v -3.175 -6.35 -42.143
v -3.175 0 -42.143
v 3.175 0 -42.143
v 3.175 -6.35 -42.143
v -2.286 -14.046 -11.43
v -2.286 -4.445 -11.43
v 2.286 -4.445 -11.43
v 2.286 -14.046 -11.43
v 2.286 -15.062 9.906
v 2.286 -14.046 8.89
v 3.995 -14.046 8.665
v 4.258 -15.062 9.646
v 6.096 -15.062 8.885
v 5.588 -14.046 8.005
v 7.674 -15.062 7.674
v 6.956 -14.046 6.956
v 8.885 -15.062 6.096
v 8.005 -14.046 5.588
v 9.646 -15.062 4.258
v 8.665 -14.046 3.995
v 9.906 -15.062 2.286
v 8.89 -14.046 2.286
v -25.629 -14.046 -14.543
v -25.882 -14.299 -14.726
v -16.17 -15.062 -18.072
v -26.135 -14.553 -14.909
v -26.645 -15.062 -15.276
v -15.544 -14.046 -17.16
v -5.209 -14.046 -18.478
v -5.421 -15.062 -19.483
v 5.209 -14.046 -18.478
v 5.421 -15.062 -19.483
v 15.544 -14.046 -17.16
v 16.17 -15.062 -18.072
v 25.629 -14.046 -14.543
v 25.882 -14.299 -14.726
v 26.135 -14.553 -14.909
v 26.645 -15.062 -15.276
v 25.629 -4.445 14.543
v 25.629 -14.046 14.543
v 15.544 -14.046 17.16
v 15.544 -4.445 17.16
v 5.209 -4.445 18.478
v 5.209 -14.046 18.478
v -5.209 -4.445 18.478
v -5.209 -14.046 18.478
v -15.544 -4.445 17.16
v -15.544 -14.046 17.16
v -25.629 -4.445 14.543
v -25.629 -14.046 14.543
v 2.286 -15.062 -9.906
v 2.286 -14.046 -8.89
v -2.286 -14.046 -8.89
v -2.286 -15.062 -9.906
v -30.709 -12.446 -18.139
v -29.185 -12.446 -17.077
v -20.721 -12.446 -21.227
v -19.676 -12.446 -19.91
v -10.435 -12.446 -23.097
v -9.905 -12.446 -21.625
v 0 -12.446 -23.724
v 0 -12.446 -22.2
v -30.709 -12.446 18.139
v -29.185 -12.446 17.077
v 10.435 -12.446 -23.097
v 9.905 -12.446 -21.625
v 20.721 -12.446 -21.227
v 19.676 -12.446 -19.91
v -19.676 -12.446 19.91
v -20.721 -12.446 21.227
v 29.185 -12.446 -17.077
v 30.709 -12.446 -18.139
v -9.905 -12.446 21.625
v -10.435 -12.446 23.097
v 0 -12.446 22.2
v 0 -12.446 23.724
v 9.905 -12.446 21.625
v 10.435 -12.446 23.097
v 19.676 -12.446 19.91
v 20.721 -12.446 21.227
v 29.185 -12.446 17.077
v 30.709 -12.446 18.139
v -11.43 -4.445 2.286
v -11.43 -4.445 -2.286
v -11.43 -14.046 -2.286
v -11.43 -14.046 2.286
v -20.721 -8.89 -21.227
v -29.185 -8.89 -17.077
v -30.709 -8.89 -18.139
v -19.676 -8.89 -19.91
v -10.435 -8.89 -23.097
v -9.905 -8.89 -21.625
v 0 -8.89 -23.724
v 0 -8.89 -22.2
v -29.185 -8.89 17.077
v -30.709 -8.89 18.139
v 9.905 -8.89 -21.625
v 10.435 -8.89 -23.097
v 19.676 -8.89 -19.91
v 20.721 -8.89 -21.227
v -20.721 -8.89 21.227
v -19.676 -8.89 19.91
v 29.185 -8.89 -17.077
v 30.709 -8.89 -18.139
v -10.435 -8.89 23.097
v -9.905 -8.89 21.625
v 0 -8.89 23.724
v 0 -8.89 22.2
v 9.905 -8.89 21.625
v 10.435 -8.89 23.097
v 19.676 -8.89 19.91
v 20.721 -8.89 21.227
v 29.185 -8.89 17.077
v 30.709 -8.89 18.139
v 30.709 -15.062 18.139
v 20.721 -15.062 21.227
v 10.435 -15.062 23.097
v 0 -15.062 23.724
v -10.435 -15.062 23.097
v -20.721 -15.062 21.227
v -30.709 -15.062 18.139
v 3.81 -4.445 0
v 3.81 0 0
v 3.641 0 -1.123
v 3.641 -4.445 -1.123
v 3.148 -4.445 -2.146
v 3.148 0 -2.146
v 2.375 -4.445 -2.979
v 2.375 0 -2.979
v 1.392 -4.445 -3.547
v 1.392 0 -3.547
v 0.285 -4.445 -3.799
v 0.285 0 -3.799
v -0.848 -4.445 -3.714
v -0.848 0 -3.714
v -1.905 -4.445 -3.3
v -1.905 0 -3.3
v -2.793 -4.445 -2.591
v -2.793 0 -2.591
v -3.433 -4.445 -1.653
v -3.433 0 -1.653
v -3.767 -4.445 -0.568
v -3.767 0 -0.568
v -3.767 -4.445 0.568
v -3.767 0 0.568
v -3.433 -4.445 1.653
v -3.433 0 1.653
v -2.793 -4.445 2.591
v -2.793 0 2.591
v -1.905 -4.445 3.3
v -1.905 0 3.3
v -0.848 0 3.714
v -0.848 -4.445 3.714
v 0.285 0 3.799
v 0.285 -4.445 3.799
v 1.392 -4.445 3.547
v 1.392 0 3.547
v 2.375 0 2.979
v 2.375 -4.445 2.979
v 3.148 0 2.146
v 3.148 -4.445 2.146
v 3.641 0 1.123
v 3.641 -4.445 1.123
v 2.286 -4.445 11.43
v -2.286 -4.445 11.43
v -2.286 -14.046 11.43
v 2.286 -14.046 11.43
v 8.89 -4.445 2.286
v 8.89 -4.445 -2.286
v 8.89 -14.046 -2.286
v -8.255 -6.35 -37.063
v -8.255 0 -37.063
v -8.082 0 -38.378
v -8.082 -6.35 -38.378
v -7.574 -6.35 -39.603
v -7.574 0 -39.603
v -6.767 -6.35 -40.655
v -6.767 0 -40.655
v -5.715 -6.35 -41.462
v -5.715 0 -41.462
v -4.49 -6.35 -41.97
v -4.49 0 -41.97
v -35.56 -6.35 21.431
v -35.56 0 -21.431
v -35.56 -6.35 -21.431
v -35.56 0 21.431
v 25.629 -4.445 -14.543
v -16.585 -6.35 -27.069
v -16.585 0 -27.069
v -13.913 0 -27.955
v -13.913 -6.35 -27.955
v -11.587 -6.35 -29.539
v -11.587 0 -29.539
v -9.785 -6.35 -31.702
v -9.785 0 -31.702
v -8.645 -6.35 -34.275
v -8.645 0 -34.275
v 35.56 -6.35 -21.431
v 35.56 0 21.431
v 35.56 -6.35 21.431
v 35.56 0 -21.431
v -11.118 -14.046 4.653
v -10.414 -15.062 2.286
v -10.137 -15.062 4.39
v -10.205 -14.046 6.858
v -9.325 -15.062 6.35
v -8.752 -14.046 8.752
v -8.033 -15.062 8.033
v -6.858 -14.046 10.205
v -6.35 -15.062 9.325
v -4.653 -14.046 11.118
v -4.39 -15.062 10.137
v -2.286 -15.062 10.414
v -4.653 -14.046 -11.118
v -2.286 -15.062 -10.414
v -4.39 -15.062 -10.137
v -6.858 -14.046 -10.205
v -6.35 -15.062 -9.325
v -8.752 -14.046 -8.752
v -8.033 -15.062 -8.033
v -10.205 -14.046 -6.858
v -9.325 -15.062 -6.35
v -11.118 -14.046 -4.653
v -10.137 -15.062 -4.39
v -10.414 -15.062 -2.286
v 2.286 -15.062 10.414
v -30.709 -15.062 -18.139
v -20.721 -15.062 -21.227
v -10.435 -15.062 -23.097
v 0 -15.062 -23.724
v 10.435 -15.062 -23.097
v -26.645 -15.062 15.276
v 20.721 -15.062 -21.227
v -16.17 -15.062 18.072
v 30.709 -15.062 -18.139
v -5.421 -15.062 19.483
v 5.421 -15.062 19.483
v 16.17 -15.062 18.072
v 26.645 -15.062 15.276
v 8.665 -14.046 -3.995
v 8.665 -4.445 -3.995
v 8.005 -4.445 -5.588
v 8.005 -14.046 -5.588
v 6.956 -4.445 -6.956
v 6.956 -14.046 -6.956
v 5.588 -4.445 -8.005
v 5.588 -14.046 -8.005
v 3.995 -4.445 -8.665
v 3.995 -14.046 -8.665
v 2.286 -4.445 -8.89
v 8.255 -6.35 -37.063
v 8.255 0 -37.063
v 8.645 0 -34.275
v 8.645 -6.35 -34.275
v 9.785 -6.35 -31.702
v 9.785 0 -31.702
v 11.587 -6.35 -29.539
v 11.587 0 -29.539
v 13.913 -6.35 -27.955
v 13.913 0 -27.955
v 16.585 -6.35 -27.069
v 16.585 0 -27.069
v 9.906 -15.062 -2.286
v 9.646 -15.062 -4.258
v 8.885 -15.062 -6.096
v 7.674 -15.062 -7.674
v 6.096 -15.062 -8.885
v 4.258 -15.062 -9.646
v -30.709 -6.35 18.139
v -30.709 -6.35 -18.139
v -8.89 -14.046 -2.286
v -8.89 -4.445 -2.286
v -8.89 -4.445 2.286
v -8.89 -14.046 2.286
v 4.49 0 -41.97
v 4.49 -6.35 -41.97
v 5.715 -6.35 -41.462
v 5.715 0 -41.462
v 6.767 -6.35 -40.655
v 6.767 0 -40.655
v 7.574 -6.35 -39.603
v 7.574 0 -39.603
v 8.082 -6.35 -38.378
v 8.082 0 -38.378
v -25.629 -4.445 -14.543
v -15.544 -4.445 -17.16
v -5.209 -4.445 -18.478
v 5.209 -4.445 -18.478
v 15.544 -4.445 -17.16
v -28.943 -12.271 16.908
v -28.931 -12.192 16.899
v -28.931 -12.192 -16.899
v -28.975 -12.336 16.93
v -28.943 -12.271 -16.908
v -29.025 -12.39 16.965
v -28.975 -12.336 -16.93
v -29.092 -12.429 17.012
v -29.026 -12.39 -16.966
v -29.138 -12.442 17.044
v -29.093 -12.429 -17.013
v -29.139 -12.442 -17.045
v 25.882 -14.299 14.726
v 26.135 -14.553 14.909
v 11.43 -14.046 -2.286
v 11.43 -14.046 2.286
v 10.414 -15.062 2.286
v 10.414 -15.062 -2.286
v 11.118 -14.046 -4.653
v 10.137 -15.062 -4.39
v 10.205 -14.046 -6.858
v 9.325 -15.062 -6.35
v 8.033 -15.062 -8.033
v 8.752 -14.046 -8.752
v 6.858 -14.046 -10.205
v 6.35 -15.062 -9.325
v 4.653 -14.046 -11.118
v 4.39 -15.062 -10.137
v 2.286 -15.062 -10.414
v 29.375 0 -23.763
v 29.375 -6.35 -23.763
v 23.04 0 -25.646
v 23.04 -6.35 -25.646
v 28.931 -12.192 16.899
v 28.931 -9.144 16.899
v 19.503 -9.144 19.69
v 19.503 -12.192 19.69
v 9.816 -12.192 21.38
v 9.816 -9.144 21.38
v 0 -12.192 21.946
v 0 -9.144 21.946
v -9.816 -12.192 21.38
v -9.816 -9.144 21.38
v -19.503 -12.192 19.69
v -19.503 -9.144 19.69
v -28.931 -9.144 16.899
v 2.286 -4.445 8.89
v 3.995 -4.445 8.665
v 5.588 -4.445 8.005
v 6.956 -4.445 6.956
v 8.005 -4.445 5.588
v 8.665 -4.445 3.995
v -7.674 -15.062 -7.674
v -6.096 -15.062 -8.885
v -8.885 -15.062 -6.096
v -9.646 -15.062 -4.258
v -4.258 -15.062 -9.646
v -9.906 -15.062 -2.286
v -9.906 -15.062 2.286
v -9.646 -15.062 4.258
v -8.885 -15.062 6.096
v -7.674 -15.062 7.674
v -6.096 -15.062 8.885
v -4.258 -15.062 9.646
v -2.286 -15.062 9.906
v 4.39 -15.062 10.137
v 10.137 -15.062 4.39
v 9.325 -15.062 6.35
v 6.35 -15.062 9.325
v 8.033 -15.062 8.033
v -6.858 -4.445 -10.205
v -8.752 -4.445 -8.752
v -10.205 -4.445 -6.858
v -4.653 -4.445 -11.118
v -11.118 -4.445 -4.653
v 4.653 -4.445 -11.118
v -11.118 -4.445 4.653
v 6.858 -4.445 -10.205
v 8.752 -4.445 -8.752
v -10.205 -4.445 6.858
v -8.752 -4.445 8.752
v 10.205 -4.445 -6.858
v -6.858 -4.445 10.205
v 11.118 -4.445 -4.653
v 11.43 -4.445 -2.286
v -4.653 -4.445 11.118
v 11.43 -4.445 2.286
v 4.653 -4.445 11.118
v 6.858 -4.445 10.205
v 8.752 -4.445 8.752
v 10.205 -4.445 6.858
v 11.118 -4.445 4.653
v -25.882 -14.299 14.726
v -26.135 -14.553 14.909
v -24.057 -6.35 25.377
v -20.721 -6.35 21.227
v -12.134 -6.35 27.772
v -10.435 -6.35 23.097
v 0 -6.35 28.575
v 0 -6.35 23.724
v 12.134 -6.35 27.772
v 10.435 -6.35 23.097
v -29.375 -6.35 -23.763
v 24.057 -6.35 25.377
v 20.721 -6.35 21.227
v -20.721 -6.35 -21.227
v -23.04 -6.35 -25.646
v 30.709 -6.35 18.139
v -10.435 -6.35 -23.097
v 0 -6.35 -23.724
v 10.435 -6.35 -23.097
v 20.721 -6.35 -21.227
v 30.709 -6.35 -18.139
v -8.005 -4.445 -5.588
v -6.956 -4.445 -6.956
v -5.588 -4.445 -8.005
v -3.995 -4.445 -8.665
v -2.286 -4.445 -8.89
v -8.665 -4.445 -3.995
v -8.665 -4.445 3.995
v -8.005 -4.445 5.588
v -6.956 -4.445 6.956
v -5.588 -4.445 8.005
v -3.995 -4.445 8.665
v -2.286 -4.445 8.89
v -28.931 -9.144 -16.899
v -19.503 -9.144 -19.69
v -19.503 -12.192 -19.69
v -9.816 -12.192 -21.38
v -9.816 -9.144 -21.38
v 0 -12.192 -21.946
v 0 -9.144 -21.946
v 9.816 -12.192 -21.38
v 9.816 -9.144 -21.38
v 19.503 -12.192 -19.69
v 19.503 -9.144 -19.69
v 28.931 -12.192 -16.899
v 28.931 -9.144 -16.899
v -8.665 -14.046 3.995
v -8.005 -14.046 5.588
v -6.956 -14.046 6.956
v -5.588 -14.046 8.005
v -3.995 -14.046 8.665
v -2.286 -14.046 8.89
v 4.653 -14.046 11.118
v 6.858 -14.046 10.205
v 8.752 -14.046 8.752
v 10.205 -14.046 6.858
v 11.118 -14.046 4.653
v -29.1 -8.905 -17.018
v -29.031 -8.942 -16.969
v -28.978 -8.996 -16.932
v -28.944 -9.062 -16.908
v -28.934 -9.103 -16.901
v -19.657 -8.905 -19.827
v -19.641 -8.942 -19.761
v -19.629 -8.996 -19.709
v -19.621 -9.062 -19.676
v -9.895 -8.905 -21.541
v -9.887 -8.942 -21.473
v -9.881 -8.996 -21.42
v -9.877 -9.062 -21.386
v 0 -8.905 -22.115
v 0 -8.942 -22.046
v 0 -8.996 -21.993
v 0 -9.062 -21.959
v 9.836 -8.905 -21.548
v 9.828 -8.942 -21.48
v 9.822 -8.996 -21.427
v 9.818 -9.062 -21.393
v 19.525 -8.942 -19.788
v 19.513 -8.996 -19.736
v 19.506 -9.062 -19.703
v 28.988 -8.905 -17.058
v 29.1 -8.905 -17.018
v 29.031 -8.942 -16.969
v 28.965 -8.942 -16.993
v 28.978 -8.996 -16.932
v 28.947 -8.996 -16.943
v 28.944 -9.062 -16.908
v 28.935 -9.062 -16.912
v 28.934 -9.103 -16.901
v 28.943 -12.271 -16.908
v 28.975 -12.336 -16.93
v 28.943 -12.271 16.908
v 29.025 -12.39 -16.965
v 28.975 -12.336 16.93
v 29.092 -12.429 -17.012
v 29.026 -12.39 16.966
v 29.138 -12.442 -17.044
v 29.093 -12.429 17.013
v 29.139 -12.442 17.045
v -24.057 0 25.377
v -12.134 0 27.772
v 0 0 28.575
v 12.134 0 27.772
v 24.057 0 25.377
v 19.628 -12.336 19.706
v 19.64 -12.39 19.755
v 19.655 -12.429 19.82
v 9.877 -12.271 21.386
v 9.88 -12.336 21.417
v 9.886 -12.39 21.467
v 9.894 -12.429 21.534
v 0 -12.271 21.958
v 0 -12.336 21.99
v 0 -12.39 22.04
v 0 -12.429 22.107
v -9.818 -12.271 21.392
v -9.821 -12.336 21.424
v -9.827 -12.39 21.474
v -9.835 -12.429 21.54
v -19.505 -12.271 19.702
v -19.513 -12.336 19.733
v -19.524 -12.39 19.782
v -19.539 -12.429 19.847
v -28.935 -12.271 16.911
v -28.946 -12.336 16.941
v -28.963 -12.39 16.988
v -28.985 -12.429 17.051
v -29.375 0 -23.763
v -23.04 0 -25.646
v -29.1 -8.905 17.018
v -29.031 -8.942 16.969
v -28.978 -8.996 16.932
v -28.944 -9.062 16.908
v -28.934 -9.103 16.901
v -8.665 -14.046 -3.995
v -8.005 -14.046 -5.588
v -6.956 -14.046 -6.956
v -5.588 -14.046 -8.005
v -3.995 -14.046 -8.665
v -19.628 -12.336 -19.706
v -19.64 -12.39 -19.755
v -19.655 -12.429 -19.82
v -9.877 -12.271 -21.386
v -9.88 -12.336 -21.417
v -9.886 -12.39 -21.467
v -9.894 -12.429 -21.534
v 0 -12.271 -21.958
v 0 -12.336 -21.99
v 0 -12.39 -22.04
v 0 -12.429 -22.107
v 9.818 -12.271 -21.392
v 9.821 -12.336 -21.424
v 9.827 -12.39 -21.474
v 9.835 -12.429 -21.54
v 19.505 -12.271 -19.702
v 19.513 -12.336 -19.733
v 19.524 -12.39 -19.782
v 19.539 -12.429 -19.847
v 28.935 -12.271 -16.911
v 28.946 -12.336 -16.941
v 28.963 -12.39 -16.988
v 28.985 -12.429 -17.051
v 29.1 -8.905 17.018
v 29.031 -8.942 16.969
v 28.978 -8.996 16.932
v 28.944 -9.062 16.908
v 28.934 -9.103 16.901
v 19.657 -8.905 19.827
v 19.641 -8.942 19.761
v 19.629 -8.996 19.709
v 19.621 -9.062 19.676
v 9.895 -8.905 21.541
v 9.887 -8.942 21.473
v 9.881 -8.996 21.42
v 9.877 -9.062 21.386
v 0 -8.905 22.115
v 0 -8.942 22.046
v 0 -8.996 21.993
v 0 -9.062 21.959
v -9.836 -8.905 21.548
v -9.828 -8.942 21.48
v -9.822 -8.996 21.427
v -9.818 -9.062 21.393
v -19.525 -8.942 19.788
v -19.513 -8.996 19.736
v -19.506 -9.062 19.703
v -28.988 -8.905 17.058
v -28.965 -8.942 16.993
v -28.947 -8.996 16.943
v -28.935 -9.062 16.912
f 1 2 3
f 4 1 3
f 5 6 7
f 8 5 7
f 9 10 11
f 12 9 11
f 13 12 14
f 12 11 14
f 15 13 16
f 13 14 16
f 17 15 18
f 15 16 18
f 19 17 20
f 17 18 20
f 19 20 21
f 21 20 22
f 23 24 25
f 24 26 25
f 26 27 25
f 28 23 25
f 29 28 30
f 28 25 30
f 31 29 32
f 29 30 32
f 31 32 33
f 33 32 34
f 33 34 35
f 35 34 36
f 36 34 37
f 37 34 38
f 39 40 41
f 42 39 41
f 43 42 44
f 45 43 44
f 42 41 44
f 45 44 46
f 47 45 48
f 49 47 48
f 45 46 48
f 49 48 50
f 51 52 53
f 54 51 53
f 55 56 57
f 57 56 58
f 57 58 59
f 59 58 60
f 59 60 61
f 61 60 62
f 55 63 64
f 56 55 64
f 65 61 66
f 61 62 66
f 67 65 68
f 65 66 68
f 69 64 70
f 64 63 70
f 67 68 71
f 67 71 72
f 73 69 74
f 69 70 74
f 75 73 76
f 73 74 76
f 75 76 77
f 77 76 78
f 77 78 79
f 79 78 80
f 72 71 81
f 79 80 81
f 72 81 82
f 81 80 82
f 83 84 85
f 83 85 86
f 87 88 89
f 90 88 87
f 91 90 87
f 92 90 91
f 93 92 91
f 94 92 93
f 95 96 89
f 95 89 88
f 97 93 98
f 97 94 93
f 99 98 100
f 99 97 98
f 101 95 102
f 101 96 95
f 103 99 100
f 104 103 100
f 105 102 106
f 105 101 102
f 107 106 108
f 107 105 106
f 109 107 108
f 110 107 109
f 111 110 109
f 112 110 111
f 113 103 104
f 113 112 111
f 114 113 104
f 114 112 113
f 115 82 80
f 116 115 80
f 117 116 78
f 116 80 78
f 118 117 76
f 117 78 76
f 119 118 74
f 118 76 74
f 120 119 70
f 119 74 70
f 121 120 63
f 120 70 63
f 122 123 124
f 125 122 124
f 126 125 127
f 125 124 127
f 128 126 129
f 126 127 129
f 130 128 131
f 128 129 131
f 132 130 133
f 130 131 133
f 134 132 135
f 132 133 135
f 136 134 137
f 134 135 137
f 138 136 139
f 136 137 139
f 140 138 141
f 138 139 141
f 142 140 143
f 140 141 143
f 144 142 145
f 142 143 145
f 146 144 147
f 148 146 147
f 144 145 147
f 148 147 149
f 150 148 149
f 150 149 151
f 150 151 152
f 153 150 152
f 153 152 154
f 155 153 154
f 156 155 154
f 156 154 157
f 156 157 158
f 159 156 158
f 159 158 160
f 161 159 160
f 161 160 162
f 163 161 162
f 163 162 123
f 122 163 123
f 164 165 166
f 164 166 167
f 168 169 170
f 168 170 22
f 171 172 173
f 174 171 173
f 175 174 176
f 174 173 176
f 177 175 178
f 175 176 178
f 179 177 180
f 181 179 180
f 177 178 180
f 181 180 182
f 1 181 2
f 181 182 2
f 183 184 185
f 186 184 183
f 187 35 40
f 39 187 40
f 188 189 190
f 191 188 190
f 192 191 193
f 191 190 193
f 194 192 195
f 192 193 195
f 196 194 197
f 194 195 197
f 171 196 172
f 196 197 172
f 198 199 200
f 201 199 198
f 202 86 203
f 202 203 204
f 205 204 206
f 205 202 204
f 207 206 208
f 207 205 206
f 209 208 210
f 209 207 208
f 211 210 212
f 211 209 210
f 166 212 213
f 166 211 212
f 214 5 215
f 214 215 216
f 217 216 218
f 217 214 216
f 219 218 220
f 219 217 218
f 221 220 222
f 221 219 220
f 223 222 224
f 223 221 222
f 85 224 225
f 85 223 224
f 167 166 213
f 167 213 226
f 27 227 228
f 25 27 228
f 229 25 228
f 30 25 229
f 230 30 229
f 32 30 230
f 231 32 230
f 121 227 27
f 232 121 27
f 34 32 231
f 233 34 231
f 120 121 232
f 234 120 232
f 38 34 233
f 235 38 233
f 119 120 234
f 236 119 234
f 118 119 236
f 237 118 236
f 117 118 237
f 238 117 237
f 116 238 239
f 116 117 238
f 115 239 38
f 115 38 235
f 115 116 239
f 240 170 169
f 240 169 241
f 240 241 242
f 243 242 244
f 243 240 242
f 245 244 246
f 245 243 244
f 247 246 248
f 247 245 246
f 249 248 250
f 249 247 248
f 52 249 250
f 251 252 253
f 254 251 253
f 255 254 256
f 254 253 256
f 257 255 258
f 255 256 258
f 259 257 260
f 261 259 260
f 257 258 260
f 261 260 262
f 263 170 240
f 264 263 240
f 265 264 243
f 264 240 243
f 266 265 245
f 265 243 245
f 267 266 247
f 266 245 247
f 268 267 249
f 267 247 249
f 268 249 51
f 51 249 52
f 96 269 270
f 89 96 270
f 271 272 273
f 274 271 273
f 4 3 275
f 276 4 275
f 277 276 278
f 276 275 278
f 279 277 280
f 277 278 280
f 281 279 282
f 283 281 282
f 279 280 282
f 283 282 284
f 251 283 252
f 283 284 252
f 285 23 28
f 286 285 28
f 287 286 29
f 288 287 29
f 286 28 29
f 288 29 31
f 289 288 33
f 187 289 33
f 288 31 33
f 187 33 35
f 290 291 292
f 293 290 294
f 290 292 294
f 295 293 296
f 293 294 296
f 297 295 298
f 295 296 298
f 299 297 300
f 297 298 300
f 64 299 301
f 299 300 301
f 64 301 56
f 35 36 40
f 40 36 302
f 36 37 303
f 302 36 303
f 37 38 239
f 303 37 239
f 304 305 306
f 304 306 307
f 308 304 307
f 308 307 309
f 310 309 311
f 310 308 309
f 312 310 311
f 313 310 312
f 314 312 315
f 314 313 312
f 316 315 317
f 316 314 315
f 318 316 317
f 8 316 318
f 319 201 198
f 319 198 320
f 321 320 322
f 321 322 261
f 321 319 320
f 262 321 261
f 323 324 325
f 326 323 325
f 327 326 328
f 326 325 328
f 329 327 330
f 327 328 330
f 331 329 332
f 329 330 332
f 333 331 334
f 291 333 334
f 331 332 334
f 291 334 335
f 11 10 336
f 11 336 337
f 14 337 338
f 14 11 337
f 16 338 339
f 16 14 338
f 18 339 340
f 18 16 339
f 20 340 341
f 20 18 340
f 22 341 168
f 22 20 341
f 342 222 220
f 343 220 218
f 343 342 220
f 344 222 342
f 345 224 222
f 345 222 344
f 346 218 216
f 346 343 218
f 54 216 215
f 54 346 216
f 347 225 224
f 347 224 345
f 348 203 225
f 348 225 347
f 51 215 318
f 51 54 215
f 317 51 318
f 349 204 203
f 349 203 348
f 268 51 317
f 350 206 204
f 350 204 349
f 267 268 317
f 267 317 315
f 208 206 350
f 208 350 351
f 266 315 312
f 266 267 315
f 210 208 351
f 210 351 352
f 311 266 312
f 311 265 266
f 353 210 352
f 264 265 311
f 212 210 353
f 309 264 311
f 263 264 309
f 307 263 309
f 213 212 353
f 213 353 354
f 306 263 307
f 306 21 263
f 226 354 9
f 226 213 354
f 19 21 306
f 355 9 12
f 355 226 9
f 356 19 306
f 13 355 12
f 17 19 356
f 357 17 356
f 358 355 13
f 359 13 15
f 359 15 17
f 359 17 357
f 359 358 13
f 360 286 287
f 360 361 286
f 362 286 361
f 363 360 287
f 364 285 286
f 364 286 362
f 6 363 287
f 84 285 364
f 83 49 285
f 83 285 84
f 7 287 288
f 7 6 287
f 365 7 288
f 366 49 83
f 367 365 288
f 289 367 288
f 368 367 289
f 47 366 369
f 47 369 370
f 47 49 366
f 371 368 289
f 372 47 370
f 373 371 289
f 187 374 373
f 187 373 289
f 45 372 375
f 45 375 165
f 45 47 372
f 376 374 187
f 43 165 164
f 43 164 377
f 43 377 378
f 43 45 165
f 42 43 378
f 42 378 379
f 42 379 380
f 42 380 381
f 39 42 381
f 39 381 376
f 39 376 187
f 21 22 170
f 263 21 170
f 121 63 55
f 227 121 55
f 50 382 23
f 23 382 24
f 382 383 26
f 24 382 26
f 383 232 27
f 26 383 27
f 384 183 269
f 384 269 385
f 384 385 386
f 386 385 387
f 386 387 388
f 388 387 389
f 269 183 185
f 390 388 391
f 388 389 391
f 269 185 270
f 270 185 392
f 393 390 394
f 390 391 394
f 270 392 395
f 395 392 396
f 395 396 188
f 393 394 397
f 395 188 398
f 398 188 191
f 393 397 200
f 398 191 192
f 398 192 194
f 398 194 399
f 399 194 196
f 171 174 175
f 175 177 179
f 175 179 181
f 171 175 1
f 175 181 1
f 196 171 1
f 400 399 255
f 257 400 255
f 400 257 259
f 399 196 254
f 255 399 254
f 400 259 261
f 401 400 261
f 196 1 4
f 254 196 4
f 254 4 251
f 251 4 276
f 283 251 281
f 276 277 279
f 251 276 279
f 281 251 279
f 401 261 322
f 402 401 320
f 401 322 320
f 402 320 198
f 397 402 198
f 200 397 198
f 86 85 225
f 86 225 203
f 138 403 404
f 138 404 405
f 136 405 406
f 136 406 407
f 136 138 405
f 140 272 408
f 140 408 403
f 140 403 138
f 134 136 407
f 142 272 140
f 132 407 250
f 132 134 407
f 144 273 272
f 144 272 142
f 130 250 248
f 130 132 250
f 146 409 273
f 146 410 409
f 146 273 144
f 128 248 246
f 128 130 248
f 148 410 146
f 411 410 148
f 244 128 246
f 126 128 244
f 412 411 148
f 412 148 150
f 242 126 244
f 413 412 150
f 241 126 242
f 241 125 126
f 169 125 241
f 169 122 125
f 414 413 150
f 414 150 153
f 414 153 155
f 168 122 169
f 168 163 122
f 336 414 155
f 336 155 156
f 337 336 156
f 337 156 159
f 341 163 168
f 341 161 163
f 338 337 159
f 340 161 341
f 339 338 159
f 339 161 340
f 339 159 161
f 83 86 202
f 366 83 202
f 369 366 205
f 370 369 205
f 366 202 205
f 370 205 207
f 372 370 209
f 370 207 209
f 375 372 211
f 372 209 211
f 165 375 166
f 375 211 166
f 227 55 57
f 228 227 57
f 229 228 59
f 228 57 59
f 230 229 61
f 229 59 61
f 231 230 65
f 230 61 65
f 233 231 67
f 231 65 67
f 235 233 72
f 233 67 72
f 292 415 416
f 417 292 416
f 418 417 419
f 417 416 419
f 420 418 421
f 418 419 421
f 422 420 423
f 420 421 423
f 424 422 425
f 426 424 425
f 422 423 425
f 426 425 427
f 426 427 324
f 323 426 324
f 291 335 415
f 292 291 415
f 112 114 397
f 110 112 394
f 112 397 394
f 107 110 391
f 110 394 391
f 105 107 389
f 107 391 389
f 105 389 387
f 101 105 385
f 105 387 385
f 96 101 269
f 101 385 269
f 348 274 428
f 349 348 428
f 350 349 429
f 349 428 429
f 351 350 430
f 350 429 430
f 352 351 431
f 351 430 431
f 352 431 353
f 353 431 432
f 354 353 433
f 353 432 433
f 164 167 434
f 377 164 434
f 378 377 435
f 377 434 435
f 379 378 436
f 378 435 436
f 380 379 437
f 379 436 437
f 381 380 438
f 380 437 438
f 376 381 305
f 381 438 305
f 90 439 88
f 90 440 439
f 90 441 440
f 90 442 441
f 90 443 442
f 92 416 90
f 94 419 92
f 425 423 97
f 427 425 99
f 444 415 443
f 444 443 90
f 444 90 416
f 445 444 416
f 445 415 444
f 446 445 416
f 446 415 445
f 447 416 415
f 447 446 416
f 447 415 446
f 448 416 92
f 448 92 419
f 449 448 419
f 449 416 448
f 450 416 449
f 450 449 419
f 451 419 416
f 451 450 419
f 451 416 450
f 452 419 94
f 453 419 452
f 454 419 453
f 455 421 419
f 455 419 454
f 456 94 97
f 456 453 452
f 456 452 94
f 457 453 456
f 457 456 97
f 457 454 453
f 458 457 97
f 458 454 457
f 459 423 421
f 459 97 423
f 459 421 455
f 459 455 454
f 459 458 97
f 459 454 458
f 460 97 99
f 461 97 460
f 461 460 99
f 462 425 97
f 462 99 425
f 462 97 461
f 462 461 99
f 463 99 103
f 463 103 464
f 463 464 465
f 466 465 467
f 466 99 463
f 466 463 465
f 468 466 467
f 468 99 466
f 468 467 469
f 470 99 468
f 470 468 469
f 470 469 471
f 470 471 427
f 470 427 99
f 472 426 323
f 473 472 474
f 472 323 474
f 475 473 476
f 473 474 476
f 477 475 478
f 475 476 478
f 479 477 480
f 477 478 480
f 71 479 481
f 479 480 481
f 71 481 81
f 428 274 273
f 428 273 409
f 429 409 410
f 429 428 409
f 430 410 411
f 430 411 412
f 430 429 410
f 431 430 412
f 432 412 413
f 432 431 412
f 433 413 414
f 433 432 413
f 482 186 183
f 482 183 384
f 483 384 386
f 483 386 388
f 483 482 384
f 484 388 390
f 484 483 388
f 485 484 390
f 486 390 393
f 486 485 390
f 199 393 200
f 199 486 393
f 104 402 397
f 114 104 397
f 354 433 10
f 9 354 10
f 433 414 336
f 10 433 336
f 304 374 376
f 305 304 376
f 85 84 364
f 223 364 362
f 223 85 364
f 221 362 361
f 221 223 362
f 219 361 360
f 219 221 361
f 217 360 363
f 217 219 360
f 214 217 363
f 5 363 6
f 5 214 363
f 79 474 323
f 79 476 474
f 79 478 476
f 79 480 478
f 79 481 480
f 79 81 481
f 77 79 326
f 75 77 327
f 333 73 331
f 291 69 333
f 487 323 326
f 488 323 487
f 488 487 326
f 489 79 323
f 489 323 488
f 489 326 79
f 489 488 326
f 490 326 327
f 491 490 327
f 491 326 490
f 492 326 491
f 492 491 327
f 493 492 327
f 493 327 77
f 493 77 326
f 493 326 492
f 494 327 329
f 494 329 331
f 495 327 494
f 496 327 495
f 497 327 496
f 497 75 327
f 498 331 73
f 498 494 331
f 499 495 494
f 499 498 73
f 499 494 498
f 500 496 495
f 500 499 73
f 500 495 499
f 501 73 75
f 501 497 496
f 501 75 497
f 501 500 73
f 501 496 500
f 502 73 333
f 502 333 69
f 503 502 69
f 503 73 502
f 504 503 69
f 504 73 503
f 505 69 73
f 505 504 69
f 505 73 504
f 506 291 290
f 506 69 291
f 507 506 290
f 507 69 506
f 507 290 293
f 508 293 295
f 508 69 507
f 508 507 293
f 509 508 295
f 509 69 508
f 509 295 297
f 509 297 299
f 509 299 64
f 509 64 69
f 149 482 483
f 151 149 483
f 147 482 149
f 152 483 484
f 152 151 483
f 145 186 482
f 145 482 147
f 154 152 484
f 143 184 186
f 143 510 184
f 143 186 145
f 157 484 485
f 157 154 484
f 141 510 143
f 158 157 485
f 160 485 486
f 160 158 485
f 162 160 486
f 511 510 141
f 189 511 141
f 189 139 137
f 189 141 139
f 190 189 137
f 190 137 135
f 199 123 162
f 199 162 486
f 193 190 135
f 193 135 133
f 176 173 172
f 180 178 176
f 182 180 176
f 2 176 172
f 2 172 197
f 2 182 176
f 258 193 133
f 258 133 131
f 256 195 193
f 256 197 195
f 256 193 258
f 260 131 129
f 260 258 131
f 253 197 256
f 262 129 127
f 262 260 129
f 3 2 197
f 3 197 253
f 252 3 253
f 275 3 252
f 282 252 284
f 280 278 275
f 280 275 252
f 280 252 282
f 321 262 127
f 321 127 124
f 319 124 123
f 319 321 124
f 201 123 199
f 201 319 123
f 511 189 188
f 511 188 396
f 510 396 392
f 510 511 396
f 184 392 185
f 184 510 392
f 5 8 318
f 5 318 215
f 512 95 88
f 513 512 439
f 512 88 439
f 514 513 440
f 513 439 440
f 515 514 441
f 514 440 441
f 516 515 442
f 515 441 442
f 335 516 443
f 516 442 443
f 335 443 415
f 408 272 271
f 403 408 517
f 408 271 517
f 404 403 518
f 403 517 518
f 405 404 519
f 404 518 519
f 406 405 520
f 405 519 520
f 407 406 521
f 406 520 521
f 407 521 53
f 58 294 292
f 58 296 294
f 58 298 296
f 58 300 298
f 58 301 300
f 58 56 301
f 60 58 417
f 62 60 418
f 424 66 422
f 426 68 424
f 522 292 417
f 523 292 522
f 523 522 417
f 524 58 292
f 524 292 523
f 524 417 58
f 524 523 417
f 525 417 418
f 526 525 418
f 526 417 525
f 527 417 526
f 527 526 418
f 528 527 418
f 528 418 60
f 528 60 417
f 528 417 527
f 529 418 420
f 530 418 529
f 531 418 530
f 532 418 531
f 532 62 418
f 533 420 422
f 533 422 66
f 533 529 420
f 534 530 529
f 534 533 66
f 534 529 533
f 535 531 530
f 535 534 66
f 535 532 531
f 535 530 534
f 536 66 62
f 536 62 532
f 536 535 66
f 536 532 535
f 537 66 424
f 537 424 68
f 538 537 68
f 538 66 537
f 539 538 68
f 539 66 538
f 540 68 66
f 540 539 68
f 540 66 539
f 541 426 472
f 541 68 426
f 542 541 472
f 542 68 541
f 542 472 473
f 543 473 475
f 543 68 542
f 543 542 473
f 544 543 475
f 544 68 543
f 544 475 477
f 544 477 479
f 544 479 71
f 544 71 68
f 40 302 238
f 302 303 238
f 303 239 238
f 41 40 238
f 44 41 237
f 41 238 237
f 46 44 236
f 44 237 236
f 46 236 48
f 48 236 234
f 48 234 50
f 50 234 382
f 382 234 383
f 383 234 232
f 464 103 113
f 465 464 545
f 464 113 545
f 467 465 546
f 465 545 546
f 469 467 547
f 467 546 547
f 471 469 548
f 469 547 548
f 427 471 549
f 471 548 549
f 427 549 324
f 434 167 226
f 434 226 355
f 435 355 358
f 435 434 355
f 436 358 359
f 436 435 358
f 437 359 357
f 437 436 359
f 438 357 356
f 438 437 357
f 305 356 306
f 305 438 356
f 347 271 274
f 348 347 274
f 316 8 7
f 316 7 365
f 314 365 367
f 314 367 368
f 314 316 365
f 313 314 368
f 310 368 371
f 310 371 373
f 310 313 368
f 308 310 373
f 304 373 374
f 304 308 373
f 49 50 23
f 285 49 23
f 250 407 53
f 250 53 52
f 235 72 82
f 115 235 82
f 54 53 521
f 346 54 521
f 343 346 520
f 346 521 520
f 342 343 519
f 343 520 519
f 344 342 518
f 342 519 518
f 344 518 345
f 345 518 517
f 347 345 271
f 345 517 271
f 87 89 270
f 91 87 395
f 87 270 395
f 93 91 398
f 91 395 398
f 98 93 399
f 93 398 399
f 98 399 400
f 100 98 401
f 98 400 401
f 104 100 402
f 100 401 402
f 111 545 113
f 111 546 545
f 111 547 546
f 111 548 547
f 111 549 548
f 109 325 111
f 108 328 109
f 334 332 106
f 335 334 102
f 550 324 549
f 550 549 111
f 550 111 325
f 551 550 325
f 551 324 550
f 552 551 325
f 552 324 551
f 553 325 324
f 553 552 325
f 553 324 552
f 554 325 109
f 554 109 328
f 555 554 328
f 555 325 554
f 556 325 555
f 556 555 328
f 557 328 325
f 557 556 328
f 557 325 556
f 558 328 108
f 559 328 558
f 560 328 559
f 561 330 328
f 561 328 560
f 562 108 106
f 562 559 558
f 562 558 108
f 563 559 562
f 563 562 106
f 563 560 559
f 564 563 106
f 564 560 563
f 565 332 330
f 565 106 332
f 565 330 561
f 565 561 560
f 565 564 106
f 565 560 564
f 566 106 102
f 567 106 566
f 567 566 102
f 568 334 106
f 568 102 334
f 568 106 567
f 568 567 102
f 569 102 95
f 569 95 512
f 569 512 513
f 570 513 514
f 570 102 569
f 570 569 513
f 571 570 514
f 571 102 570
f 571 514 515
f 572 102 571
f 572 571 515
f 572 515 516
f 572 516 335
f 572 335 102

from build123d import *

# Parameters (mm, degrees)
BOSS_EXTRUDE1_DEPTH = 6.35
BOSS_EXTRUDE2_DEPTH = 8.7122
CUT_EXTRUDE1_START  = 2.54
SKETCH3_W           = 71.12
SKETCH3_H           = 57.15
CUT_EXTRUDE1_DEPTH  = 3.556
HOLE1_D             = 7.62
CUT_EXTRUDE2_DEPTH  = 10.6172
SKETCH8_W           = 22.86
SKETCH8_H           = 22.86
SKETCH8_W_2         = 17.78
SKETCH8_H_2         = 17.78
BOSS_EXTRUDE3_DEPTH = 10.6172
FILLET1_R           = 0.254
FILLET2_R           = 6.604
FILLET3_R           = 9.144
CHAMFER1_SIZE       = 1.016
BOSS_EXTRUDE4_DEPTH = 6.35


with BuildPart() as part:
    # Sketch1 → Boss-Extrude1 (new body)
    with BuildSketch(Plane(origin=(0, 0, 0), x_dir=(1, 0, 0), z_dir=(0, 1, 0))):
        with BuildLine():
            Line((-35.56, 21.431101635), (-35.56, -21.431101635))
            ThreePointArc((-35.56, -21.431101635), (0, -28.575), (35.56, -21.431101635))
            Line((35.56, -21.431101635), (35.56, 21.431101635))
            ThreePointArc((35.56, 21.431101635), (0, 28.575), (-35.56, 21.431101635))
        make_face()
    extrude(amount=-BOSS_EXTRUDE1_DEPTH)

    # Sketch2 → Boss-Extrude2 (add)
    with BuildSketch(Plane.XZ.offset(6.35)):
        with BuildLine():
            Line((30.7086, -18.139073262), (30.7086, 18.139073262))
            ThreePointArc((30.7086, 18.139073262), (0, 23.7236), (-30.7086, 18.139073262))
            Line((-30.7086, 18.139073262), (-30.7086, -18.139073262))
            ThreePointArc((-30.7086, -18.139073262), (0, -23.7236), (30.7086, -18.139073262))
        make_face()
    extrude(amount=BOSS_EXTRUDE2_DEPTH)

    # Sketch3 → Cut-Extrude1 (cut)
    with BuildSketch(Plane.XZ.offset(6.35).offset(CUT_EXTRUDE1_START)):
        Rectangle(SKETCH3_W, SKETCH3_H)
        with BuildLine():
            Line((28.9306, -16.898824264), (28.9306, 16.898824264))
            ThreePointArc((28.9306, 16.898824264), (0, 21.9456), (-28.9306, 16.898824264))
            Line((-28.9306, 16.898824264), (-28.9306, -16.898824264))
            ThreePointArc((-28.9306, -16.898824264), (0, -21.9456), (28.9306, -16.898824264))
        make_face(mode=Mode.SUBTRACT)
    extrude(amount=CUT_EXTRUDE1_DEPTH, mode=Mode.SUBTRACT)

    # Hole1 (through all)
    with Locations(Plane(origin=(0, -15.0622, 0), x_dir=(-1, 0, 0), z_dir=(0, -1, 0))):
        with Locations((0, 0)):
            Hole(HOLE1_D / 2)

    # Sketch7 → Cut-Extrude2 (cut)
    with BuildSketch(Plane.XZ.offset(15.0622)):
        with BuildLine():
            Line((25.6286, -14.54323086), (25.6286, 14.54323086))
            ThreePointArc((25.6286, 14.54323086), (0, 18.6436), (-25.6286, 14.54323086))
            Line((-25.6286, 14.54323086), (-25.6286, -14.54323086))
            ThreePointArc((-25.6286, -14.54323086), (0, -18.6436), (25.6286, -14.54323086))
        make_face()
    extrude(amount=-CUT_EXTRUDE2_DEPTH, mode=Mode.SUBTRACT)

    # Sketch8 → Boss-Extrude3 (add)
    with BuildSketch(Plane.XZ.offset(4.445)):
        Rectangle(SKETCH8_W, SKETCH8_H)
        Rectangle(SKETCH8_W_2, SKETCH8_H_2, mode=Mode.SUBTRACT)
    extrude(amount=BOSS_EXTRUDE3_DEPTH)

    # Fillet1
    fillet1_edges = [part.edges().sort_by_distance(p)[0] for p in [
        (0, -8.89, -21.9456),
        (28.9306, -8.89, 0),
        (0, -8.89, 21.9456),
        (-28.9306, -8.89, 0),
        (0, -12.446, -21.9456),
        (28.9306, -12.446, 0),
        (0, -12.446, 21.9456),
        (-28.9306, -12.446, 0),
    ]]
    fillet(fillet1_edges, radius=FILLET1_R)

    # Fillet2
    fillet2_edges = [part.edges().sort_by_distance(p)[0] for p in [
        (8.89, -9.7536, -8.89),
        (-8.89, -9.7536, -8.89),
        (-8.89, -9.7536, 8.89),
        (8.89, -9.7536, 8.89),
    ]]
    fillet(fillet2_edges, radius=FILLET2_R)

    # Fillet3
    fillet3_edges = [part.edges().sort_by_distance(p)[0] for p in [
        (-11.43, -9.7536, -11.43),
        (-11.43, -9.7536, 11.43),
        (11.43, -9.7536, 11.43),
        (11.43, -9.7536, -11.43),
    ]]
    fillet(fillet3_edges, radius=FILLET3_R)

    # Chamfer1
    chamfer1_edges = [part.edges().sort_by_distance(p)[0] for p in [
        (-8.89, -15.0622, 0),
        (0, -15.0622, -8.89),
        (8.89, -15.0622, 0),
        (0, -15.0622, 8.89),
        (-6.955733183, -15.0622, -6.955733183),
        (6.955733183, -15.0622, -6.955733183),
        (-6.955733183, -15.0622, 6.955733183),
        (6.955733183, -15.0622, 6.955733183),
        (-11.43, -15.0622, 0),
        (0, -15.0622, 11.43),
        (0, -15.0622, -11.43),
        (11.43, -15.0622, 0),
        (8.751784407, -15.0622, -8.751784407),
        (-8.751784407, -15.0622, -8.751784407),
        (8.751784407, -15.0622, 8.751784407),
        (-8.751784407, -15.0622, 8.751784407),
        (0, -15.0622, -18.6436),
        (25.6286, -15.0622, 0),
        (0, -15.0622, 18.6436),
        (-25.6286, -15.0622, 0),
    ]]
    chamfer(chamfer1_edges, length=CHAMFER1_SIZE)

    # Sketch9 → Boss-Extrude4 (add)
    with BuildSketch(Plane(origin=(0, 0, 0), x_dir=(1, 0, 0), z_dir=(0, 1, 0))):
        with BuildLine():
            Line((-3.175, 42.142831106), (3.175, 42.142831106))
            ThreePointArc((3.175, 42.142831106), (6.767102448, 40.654933554), (8.255, 37.062831106))
            ThreePointArc((8.255, 37.062831106), (10.610545149, 30.557749671), (16.584937888, 27.069009381))
            ThreePointArc((16.584937888, 27.069009381), (0, 28.575), (-16.584937888, 27.069009381))
            ThreePointArc((-16.584937888, 27.069009381), (-10.610545149, 30.557749671), (-8.255, 37.062831106))
            ThreePointArc((-8.255, 37.062831106), (-6.767102448, 40.654933554), (-3.175, 42.142831106))
        make_face()
    extrude(amount=-BOSS_EXTRUDE4_DEPTH)


solid = part.part
